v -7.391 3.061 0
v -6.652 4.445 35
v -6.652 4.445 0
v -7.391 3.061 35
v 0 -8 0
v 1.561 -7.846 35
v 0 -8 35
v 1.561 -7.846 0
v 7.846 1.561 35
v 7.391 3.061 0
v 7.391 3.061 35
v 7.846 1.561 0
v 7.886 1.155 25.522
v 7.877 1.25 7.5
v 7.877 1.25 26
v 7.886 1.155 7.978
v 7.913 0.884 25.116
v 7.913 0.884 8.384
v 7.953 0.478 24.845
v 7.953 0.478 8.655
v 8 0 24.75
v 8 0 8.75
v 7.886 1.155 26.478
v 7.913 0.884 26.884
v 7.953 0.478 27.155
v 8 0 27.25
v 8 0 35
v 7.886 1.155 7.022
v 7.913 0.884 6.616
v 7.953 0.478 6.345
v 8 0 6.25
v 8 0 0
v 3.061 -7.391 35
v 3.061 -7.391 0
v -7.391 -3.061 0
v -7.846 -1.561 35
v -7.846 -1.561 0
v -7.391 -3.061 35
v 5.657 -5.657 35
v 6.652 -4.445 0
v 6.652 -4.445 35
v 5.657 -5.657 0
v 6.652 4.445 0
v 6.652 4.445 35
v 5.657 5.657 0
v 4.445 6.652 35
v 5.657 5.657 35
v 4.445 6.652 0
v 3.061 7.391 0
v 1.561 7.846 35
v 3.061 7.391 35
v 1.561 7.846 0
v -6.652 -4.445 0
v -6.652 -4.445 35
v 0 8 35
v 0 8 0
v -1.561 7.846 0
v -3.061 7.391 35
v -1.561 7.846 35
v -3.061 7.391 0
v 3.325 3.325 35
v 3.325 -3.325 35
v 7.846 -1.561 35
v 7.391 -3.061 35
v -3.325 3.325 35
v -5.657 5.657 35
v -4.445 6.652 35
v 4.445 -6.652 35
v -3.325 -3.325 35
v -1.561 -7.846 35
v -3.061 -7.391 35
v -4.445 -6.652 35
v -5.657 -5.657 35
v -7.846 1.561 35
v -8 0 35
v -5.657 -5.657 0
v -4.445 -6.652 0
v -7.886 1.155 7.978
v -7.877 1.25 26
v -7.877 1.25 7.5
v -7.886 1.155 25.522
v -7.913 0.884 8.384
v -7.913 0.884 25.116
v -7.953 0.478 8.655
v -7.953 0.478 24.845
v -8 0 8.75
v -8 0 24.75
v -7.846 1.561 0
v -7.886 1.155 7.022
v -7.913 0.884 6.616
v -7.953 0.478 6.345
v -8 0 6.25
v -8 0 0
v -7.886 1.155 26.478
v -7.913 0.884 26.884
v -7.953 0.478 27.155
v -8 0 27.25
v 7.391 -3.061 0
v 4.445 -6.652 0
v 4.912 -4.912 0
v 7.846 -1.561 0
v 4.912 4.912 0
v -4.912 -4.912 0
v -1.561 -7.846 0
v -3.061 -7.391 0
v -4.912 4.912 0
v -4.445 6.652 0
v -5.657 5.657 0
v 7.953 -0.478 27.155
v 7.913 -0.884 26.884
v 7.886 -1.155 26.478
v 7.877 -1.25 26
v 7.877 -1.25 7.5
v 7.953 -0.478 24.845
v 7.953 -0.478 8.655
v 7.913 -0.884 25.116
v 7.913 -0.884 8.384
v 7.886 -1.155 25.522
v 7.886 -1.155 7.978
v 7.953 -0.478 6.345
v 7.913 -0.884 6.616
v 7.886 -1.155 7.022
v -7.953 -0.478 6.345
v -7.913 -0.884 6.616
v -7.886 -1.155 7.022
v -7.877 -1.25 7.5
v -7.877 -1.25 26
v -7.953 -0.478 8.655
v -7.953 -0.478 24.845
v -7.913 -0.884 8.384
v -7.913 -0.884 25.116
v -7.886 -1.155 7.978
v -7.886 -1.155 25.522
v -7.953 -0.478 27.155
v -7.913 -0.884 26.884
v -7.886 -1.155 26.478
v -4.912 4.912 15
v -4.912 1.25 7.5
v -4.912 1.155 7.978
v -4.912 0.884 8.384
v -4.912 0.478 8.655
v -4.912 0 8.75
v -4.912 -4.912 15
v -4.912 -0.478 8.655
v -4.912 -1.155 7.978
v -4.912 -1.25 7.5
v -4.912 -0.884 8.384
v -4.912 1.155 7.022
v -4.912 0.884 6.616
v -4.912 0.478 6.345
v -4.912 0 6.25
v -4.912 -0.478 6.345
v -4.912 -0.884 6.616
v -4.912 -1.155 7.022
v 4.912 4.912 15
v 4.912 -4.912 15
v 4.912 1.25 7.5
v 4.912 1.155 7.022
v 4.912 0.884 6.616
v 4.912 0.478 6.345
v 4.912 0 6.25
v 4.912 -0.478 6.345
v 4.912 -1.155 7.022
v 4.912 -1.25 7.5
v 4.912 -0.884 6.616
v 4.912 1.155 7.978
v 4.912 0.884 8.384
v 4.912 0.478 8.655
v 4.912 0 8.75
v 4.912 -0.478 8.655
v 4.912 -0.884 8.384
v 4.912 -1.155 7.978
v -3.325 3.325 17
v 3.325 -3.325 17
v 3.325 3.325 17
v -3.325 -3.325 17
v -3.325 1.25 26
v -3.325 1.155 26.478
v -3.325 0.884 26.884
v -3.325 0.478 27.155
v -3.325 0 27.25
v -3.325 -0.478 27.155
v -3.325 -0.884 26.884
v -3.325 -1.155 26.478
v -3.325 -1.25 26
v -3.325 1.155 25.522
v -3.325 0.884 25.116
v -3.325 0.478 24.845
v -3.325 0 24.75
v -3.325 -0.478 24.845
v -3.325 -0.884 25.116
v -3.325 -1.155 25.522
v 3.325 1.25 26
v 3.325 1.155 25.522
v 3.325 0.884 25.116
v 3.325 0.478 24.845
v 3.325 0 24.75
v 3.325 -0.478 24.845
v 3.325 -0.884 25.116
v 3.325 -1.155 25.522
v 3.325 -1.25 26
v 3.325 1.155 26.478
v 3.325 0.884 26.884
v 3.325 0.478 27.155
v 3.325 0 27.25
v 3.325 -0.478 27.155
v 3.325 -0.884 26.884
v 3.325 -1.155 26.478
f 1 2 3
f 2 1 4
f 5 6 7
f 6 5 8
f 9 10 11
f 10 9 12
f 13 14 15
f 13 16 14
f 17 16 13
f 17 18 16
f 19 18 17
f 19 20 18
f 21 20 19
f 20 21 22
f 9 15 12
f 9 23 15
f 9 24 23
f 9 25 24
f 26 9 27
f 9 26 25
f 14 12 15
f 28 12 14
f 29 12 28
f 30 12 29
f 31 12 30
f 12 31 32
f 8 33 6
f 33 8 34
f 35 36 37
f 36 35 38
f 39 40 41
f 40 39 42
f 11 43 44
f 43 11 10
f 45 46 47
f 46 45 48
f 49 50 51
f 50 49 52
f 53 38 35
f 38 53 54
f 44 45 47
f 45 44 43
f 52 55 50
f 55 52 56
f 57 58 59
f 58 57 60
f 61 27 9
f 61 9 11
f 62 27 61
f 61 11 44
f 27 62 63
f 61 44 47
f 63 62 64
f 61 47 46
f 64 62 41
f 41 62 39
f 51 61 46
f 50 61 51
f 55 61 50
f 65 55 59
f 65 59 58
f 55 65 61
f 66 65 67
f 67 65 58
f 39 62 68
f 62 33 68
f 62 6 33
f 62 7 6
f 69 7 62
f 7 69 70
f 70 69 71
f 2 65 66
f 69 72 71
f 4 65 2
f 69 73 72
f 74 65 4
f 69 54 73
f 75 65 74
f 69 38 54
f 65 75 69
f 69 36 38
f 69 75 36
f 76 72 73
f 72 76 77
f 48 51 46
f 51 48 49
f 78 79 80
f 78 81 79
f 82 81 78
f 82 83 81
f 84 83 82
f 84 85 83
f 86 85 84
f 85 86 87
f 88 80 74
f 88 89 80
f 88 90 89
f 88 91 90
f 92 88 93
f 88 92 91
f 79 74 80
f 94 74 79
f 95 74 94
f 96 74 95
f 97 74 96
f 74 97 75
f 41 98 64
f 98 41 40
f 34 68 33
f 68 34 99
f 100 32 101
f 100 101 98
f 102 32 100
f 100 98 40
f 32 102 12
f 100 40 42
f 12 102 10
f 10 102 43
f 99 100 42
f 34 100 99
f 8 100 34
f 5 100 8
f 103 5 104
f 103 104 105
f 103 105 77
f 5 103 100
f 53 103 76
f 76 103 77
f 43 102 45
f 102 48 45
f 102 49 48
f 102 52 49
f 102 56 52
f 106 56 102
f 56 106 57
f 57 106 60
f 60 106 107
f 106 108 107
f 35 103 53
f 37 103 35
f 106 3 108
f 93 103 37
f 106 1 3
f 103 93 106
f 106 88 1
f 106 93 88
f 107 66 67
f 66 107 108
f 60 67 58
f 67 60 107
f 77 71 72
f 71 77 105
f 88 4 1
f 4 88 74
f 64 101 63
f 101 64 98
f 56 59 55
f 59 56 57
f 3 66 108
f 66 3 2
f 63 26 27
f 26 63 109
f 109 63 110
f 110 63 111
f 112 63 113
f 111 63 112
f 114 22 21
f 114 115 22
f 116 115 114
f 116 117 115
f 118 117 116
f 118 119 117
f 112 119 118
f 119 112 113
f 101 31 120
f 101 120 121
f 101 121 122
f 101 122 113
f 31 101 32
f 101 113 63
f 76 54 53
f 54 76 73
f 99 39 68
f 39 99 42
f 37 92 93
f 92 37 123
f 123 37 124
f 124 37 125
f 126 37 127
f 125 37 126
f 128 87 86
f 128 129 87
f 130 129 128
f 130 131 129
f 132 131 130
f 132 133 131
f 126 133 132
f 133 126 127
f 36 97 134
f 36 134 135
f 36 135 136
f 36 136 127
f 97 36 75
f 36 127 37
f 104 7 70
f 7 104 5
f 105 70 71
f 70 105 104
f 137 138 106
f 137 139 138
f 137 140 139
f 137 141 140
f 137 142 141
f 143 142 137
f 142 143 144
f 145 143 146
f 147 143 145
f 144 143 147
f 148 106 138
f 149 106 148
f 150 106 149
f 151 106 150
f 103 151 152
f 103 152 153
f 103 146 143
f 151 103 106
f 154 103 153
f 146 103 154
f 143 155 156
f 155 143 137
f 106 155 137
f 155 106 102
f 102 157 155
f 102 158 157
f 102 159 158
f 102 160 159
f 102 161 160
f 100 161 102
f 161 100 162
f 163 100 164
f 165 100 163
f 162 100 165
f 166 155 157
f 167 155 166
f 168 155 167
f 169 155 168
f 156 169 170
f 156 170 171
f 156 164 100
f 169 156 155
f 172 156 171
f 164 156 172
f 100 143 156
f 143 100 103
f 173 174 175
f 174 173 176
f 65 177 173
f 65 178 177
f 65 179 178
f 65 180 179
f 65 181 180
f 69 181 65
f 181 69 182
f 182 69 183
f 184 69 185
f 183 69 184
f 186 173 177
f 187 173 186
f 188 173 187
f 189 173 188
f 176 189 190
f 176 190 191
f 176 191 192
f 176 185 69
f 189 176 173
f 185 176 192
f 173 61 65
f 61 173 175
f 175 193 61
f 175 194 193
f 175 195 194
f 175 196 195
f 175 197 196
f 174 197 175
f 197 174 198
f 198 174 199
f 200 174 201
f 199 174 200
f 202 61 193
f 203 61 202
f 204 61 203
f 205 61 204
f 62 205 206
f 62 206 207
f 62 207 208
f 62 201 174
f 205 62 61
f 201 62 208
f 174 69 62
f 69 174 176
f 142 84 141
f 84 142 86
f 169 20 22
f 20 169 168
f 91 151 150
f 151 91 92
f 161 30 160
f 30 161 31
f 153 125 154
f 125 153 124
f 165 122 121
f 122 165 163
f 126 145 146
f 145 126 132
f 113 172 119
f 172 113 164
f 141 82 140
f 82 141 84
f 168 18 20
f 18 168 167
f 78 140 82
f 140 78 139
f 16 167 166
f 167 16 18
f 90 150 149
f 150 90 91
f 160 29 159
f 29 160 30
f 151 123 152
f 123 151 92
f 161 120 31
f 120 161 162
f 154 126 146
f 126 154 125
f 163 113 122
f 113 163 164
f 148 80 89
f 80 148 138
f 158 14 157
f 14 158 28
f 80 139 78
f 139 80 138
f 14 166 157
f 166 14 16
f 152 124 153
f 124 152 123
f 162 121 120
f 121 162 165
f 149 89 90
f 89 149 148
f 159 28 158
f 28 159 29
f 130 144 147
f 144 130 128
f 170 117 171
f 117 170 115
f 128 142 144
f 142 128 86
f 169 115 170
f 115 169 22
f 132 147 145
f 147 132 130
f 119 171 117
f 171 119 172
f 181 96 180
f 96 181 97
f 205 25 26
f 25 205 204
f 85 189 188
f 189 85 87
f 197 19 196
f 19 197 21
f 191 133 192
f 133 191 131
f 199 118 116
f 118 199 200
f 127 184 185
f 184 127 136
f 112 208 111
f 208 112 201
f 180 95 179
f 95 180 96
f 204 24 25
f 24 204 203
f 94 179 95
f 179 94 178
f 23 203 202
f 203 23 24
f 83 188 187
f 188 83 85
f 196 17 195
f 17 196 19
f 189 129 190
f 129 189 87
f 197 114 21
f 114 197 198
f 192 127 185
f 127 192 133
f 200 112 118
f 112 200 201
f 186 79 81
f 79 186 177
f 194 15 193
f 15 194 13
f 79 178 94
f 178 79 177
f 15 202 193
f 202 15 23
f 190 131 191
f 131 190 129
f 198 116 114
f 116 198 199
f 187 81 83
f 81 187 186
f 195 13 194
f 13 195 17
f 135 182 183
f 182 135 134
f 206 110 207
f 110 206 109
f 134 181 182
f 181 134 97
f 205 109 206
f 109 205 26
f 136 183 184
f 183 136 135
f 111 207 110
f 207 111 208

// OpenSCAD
/* ==========================================================
   ACOPLADOR DE EJE ESCALONADO
   ----------------------------------------------------------
   Transición: Cuadrado 3/8" (sync gear) → Cuadrado 1/4" (tornillo)
   Pieza intermedia que conecta el tren de transmisión V10.1
   con los tornillos co-rotantes V1.
   ========================================================== */

// Lado sync gear (3/8" = 9.525mm)
sq_large      = 9.525;
cl_large      = 0.3;      // clearance
bore_large    = sq_large + cl_large;  // 9.825mm

// Lado tornillo (1/4" = 6.35mm)
sq_small      = 6.35;
cl_small      = 0.3;      // clearance
bore_small    = sq_small + cl_small;  // 6.65mm

// Dimensiones del acoplador
coupler_od    = 16;        // Diámetro exterior
coupler_len   = 35;        // Longitud total
hole_depth_lg = 15;        // Profundidad del hueco 3/8"
hole_depth_sm = 18;        // Profundidad del hueco 1/4"
// Dejamos 2mm de pared sólida en el medio (15 + 18 + 2 = 35)

// Tornillos de fijación
set_screw_d   = 2.5;       // M2.5

/* --- Parámetro visual --- */
part = "coupler"; // [coupler, section_view]

module acoplador() {
    difference() {
        // Cuerpo cilíndrico principal
        cylinder(d=coupler_od, h=coupler_len, $fn=32);

        // Hueco cuadrado 3/8" (recibe el eje del tren)
        translate([0, 0, -1])
        linear_extrude(hole_depth_lg + 1)
        square([bore_large, bore_large], center=true);

        // Hueco cuadrado 1/4" (recibe el eje de metal del tornillo)
        translate([0, 0, coupler_len - hole_depth_sm])
        linear_extrude(hole_depth_sm + 1)
        square([bore_small, bore_small], center=true);

        // Tornillo de fijación transversal (zona 3/8")
        translate([0, 0, hole_depth_lg/2])
        rotate([0, 90, 0])
        cylinder(d=set_screw_d, h=coupler_od + 2, center=true, $fn=16);

        // Tornillo de fijación transversal (zona 1/4")
        translate([0, 0, coupler_len - hole_depth_sm/2])
        rotate([0, 90, 0])
        cylinder(d=set_screw_d, h=coupler_od + 2, center=true, $fn=16);
    }
}

module section_view() {
    difference() {
        acoplador();
        translate([0, -50, -1]) cube([100, 100, 100]);
    }
}

if (part == "coupler") {
    color("Orange") acoplador();
} else if (part == "section_view") {
    color("Orange") section_view();
}
